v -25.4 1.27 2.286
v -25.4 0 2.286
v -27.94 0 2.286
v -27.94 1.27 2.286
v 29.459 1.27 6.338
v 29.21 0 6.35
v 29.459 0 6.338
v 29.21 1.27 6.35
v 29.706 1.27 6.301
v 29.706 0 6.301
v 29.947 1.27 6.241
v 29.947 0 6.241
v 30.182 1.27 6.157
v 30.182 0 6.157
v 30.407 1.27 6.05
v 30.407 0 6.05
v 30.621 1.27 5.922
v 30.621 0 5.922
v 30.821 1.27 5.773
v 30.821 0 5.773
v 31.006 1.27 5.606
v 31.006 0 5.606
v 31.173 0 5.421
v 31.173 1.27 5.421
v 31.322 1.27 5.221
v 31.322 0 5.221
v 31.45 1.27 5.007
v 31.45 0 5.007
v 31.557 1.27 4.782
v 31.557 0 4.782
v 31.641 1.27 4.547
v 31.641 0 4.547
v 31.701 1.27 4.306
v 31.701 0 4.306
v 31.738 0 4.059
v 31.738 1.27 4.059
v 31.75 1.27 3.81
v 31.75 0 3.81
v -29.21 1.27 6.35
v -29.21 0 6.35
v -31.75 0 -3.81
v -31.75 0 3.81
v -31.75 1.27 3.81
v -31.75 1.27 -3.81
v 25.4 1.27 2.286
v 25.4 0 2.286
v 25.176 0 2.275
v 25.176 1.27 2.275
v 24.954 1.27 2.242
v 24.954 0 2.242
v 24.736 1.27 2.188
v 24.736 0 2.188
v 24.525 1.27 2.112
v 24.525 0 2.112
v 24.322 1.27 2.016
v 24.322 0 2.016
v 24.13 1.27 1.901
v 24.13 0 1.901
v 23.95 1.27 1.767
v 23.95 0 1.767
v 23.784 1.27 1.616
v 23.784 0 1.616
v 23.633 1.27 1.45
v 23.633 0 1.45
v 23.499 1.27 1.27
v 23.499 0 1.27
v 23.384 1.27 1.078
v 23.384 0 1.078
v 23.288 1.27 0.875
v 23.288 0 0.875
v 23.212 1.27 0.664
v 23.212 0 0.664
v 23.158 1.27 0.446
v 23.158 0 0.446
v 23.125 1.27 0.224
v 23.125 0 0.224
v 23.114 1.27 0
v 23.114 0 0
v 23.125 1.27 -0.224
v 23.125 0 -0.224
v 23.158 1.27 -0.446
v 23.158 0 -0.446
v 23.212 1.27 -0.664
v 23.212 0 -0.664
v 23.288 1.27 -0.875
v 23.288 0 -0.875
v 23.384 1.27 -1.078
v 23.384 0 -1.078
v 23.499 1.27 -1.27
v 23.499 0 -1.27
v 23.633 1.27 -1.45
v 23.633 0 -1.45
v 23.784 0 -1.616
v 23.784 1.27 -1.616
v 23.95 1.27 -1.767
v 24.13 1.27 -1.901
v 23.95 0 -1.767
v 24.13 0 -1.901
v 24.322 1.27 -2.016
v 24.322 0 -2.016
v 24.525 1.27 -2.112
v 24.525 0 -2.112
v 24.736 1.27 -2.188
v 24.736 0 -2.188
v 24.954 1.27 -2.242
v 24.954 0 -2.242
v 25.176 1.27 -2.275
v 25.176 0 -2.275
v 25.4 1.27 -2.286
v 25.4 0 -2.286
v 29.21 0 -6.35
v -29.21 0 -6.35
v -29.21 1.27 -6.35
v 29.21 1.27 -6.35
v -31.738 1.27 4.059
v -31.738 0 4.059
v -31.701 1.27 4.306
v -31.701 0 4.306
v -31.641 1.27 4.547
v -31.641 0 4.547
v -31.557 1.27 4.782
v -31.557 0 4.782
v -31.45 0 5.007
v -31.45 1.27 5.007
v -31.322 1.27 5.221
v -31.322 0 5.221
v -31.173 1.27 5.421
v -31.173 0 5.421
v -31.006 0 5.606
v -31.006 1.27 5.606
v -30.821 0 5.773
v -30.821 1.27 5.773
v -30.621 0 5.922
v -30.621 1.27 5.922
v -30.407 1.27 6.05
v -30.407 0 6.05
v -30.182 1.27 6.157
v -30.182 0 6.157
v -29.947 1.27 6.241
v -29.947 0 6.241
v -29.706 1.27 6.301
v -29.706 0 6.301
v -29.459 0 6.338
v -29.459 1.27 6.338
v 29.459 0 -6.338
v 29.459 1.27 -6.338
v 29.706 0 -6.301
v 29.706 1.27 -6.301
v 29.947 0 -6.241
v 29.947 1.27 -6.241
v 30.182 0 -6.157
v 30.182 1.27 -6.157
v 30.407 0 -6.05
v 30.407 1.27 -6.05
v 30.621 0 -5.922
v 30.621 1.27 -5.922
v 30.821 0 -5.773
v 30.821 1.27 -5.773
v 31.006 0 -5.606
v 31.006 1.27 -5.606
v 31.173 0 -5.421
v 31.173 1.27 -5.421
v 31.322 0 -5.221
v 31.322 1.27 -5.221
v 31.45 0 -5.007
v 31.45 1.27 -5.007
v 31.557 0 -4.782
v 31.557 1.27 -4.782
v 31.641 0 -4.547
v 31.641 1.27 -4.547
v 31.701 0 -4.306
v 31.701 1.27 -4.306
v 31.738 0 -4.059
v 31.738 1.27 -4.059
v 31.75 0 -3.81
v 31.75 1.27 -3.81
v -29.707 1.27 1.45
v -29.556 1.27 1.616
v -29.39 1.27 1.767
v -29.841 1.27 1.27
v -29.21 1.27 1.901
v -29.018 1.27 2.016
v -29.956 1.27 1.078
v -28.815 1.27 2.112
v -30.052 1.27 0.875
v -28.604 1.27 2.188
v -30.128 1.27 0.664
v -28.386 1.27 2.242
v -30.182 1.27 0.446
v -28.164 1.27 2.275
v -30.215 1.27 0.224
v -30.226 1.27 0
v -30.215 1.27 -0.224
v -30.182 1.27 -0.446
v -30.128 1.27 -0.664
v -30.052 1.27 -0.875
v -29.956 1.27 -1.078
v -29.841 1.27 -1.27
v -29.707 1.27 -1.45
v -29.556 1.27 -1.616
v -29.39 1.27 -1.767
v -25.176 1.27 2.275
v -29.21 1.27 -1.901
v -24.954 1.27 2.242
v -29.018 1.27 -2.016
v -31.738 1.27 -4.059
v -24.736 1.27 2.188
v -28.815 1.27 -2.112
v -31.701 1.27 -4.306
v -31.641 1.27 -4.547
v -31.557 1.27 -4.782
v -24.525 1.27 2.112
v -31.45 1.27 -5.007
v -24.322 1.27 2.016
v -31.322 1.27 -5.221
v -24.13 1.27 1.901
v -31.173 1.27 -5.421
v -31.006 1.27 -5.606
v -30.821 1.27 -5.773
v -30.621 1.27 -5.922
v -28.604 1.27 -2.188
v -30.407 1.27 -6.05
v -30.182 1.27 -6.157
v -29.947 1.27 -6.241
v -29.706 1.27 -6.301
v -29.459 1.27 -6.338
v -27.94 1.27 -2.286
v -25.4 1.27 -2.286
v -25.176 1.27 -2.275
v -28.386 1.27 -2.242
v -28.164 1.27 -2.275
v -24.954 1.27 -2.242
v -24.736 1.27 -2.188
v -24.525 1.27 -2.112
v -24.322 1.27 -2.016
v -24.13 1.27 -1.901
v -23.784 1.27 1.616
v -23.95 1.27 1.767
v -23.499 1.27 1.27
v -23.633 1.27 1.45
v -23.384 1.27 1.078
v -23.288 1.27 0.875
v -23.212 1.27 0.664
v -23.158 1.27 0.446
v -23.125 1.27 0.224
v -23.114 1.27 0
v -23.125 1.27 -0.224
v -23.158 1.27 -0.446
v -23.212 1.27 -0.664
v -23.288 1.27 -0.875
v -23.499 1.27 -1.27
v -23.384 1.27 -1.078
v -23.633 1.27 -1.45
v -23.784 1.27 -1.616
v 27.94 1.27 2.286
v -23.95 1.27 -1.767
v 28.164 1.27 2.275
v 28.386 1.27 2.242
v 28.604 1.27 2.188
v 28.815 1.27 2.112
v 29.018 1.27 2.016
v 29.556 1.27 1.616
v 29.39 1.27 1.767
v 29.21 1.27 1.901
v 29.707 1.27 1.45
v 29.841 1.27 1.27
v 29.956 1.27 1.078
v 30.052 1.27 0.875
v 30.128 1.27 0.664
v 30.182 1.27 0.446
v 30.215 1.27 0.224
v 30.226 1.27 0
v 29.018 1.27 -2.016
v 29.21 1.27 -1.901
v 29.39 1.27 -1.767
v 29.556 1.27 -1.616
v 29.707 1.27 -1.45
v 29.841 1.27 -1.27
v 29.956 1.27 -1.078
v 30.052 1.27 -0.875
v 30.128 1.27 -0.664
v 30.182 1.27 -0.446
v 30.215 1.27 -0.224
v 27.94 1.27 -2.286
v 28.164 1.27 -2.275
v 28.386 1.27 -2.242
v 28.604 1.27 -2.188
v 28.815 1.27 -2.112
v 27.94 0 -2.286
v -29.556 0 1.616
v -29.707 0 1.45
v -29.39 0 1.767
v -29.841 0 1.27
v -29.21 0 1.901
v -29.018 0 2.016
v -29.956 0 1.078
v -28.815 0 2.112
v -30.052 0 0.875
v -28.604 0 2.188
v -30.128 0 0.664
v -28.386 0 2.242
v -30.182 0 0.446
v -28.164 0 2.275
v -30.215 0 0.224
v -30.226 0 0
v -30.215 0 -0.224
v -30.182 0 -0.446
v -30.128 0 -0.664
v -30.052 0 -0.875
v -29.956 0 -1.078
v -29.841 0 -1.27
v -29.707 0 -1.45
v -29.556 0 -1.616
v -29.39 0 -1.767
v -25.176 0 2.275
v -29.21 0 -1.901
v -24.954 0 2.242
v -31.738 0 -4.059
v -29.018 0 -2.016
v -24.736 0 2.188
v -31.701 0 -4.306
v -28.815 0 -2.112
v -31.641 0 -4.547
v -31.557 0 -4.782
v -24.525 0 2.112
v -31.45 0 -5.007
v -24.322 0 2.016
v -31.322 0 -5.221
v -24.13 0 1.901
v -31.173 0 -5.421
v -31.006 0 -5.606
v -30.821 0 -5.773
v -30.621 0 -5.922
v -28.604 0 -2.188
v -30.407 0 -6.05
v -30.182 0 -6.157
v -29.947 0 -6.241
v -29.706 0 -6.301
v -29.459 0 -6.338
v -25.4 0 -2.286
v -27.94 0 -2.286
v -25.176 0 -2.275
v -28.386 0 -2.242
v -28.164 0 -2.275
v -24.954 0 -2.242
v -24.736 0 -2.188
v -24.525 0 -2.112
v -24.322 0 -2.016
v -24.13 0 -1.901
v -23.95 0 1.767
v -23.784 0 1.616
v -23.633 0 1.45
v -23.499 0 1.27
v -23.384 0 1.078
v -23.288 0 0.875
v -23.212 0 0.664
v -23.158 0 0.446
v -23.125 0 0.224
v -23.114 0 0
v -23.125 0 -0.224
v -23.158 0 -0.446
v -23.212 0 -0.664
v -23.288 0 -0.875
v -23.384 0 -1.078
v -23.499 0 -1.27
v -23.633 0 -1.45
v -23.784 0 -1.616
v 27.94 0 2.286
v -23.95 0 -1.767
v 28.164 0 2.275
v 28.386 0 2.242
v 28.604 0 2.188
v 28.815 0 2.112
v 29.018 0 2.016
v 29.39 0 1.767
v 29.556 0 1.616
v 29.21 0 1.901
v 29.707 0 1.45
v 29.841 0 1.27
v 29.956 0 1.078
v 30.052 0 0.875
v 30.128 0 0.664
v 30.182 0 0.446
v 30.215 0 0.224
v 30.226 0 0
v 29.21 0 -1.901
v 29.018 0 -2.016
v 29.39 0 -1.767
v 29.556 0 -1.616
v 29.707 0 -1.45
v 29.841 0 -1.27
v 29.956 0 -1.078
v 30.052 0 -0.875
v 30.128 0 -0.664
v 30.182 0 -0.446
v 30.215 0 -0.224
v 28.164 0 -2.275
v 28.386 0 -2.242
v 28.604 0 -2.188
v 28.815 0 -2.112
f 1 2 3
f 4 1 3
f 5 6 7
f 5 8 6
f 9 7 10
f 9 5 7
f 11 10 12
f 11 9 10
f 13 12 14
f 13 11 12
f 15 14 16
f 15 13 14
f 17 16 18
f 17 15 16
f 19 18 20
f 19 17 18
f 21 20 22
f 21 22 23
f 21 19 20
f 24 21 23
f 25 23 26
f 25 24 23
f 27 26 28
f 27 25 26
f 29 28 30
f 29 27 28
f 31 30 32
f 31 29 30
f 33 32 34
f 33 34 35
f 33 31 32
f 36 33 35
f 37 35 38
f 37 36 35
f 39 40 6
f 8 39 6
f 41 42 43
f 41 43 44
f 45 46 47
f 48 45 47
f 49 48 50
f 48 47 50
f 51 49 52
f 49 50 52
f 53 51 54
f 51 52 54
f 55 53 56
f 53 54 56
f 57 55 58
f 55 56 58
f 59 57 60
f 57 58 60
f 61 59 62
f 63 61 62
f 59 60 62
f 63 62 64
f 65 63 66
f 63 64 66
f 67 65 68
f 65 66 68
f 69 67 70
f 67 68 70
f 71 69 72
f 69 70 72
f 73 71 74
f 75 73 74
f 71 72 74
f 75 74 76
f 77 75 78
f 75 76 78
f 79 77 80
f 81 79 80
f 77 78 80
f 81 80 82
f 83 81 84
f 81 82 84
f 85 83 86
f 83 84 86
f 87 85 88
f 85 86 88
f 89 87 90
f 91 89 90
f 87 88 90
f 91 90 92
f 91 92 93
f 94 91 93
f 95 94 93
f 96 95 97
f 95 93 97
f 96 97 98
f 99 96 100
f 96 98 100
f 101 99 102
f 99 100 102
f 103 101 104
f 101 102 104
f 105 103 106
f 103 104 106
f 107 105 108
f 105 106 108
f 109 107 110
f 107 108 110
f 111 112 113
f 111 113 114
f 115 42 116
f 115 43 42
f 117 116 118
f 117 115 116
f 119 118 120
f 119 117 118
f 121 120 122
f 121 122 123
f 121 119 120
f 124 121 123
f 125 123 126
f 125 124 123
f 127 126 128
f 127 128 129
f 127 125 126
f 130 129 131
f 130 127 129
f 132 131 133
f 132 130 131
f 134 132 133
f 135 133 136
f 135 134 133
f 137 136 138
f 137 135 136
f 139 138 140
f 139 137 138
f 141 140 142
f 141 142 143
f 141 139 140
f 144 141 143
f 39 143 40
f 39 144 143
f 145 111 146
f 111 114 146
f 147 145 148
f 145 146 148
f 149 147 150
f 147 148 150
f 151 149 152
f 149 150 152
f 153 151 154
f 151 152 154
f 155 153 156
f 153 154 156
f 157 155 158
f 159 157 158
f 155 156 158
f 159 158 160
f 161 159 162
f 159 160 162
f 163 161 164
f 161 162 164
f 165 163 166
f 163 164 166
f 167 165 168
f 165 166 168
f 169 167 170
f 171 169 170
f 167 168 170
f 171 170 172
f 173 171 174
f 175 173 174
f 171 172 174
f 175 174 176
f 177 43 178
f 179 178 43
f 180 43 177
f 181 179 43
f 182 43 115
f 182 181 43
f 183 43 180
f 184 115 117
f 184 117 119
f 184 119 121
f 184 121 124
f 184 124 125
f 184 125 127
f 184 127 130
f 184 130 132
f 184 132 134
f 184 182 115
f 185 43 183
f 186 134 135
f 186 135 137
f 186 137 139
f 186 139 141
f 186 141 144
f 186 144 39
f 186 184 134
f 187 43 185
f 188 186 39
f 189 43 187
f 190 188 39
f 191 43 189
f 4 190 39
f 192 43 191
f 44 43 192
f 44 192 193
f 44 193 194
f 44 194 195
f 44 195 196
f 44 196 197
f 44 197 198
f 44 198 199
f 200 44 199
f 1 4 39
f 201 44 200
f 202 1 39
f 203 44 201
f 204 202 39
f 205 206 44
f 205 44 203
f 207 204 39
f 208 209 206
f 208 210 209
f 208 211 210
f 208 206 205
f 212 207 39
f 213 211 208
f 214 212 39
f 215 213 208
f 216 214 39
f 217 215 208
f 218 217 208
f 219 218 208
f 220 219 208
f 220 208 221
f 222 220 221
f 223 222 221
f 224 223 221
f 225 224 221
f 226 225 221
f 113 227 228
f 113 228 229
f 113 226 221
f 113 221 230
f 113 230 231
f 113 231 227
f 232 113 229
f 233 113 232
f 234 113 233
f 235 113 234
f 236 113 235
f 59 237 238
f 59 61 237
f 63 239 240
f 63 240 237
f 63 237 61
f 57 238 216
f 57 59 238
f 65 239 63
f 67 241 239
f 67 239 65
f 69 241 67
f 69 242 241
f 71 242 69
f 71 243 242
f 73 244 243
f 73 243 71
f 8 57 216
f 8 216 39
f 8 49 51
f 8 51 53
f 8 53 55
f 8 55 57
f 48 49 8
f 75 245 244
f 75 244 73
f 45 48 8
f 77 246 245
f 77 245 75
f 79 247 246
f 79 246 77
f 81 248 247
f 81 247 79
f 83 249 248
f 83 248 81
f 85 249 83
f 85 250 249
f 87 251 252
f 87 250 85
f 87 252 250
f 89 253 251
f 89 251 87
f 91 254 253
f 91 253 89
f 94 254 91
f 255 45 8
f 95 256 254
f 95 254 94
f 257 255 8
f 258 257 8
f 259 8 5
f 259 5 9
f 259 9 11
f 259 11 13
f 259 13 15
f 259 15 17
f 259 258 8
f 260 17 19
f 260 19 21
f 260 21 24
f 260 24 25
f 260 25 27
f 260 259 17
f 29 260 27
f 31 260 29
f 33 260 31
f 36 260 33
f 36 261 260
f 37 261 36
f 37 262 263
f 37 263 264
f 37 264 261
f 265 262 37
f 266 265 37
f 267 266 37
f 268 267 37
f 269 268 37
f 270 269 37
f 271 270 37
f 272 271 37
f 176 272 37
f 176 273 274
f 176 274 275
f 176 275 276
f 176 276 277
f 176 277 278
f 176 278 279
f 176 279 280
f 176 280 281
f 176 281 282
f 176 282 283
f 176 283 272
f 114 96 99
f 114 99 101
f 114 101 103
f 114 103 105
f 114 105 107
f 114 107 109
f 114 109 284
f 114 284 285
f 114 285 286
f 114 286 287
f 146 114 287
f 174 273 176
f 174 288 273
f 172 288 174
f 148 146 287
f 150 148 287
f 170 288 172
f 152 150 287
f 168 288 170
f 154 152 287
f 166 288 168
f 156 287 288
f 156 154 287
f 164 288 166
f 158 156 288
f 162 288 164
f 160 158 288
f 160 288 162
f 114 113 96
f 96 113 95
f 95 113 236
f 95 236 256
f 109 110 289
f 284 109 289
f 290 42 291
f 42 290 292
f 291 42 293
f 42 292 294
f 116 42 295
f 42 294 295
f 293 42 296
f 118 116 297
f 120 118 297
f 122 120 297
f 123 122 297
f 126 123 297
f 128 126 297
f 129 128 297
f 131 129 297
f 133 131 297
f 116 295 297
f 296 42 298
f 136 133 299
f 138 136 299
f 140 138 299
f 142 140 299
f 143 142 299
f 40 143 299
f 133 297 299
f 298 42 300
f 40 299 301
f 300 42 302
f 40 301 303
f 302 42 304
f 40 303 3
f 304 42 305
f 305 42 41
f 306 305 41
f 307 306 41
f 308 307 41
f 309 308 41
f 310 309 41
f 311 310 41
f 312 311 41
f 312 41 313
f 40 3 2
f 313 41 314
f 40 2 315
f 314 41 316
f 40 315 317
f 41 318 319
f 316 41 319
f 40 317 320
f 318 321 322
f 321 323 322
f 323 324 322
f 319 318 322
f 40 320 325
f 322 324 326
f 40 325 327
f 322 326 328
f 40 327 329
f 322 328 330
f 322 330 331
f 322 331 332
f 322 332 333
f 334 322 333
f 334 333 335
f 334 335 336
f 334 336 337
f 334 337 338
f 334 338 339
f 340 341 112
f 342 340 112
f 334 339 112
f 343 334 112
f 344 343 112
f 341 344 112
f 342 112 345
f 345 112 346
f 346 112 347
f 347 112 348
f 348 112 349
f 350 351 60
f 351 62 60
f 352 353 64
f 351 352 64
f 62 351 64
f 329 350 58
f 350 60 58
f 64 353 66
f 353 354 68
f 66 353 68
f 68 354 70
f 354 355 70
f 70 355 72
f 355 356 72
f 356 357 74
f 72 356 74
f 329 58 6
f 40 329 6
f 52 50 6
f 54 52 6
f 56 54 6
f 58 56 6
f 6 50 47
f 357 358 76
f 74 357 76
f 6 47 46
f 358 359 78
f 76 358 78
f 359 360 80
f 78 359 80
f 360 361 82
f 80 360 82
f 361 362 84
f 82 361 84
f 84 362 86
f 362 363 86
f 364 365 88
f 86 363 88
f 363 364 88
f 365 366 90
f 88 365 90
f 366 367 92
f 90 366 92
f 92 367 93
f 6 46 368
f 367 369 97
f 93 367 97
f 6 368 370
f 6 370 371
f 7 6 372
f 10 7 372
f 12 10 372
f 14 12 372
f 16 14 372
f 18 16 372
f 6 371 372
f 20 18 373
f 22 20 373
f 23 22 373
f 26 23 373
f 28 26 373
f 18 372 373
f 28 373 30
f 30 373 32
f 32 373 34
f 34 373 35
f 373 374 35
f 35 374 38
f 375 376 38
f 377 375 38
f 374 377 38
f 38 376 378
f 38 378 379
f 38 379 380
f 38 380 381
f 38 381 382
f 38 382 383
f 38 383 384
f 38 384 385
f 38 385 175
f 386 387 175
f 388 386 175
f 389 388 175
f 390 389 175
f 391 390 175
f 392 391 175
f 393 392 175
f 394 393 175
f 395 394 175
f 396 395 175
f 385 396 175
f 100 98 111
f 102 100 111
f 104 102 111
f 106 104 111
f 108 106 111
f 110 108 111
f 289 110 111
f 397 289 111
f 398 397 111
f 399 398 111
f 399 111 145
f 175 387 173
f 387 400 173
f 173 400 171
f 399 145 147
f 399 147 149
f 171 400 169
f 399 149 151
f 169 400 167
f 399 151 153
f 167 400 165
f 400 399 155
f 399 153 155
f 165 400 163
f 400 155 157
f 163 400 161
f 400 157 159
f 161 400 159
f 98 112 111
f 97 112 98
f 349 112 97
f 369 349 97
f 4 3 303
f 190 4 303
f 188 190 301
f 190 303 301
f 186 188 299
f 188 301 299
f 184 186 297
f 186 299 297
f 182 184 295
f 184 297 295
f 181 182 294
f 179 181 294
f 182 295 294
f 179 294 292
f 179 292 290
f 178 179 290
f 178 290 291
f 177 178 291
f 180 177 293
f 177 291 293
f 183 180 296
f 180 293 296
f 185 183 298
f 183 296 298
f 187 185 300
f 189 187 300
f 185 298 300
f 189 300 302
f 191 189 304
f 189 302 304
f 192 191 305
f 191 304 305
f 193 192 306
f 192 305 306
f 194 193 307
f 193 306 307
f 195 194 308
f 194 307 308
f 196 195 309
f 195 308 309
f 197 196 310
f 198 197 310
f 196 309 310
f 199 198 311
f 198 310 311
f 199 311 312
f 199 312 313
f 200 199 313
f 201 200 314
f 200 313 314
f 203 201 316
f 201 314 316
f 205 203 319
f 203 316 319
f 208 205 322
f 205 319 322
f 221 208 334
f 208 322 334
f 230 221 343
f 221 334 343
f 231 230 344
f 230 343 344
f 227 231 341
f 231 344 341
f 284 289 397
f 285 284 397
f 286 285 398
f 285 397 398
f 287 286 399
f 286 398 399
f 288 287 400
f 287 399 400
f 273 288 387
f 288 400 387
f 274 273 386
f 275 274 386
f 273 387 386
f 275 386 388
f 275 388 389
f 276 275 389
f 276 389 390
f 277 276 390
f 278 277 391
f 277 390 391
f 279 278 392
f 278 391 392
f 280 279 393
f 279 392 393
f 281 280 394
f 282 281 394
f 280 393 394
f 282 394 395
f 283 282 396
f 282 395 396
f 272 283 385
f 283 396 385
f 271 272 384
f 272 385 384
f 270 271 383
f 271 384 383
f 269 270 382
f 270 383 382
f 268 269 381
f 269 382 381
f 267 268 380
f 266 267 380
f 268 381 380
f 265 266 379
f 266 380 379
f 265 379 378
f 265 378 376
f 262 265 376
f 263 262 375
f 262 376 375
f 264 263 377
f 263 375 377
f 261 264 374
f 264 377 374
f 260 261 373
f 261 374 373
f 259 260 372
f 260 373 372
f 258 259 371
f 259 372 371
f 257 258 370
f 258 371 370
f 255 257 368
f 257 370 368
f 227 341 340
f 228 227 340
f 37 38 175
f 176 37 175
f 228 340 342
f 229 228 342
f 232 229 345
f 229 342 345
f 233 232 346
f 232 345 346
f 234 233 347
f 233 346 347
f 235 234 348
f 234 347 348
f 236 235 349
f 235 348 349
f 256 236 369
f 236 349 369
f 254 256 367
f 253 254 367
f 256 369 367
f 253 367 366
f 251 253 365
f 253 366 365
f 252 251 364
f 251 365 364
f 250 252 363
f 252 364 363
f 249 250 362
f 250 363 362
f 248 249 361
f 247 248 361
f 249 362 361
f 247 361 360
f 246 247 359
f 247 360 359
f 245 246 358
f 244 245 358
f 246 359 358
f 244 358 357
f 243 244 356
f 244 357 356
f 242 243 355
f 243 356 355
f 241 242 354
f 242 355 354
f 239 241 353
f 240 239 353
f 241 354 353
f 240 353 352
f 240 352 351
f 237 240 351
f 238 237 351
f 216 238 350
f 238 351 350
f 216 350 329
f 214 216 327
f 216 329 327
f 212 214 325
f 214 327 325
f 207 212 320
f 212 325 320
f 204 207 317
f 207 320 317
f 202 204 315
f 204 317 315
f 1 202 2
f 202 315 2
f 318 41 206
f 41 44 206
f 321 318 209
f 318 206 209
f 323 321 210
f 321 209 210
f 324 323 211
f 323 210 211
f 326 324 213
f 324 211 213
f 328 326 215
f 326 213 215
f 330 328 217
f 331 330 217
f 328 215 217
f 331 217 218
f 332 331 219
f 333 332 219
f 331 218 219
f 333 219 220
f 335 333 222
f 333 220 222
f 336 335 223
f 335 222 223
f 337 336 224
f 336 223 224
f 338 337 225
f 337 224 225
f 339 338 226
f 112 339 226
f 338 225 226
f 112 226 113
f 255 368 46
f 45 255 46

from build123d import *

# Parameters (mm, degrees)
SKETCH1_W           = 63.5
SKETCH1_H           = 12.7
BOSS_EXTRUDE1_DEPTH = 1.27
FILLET1_R           = 2.54


with BuildPart() as part:
    # Sketch1 → Boss-Extrude1 (new body)
    with BuildSketch(Plane(origin=(0, 0, 0), x_dir=(1, 0, 0), z_dir=(0, 1, 0))):
        Rectangle(SKETCH1_W, SKETCH1_H)
        with BuildLine():
            Line((25.4, 2.286), (27.94, 2.286))
            ThreePointArc((27.94, 2.286), (30.226, 0), (27.94, -2.286))
            Line((27.94, -2.286), (25.4, -2.286))
            ThreePointArc((25.4, -2.286), (23.114, 0), (25.4, 2.286))
        make_face(mode=Mode.SUBTRACT)
        with BuildLine():
            Line((-27.94, 2.286), (-25.4, 2.286))
            ThreePointArc((-25.4, 2.286), (-23.114, 0), (-25.4, -2.286))
            Line((-25.4, -2.286), (-27.94, -2.286))
            ThreePointArc((-27.94, -2.286), (-30.226, 0), (-27.94, 2.286))
        make_face(mode=Mode.SUBTRACT)
    extrude(amount=BOSS_EXTRUDE1_DEPTH)

    # Fillet1
    fillet1_edges = [part.edges().sort_by_distance(p)[0] for p in [
        (-31.75, 0.635, -6.35),
        (31.75, 0.635, -6.35),
        (31.75, 0.635, 6.35),
        (-31.75, 0.635, 6.35),
    ]]
    fillet(fillet1_edges, radius=FILLET1_R)


solid = part.part
